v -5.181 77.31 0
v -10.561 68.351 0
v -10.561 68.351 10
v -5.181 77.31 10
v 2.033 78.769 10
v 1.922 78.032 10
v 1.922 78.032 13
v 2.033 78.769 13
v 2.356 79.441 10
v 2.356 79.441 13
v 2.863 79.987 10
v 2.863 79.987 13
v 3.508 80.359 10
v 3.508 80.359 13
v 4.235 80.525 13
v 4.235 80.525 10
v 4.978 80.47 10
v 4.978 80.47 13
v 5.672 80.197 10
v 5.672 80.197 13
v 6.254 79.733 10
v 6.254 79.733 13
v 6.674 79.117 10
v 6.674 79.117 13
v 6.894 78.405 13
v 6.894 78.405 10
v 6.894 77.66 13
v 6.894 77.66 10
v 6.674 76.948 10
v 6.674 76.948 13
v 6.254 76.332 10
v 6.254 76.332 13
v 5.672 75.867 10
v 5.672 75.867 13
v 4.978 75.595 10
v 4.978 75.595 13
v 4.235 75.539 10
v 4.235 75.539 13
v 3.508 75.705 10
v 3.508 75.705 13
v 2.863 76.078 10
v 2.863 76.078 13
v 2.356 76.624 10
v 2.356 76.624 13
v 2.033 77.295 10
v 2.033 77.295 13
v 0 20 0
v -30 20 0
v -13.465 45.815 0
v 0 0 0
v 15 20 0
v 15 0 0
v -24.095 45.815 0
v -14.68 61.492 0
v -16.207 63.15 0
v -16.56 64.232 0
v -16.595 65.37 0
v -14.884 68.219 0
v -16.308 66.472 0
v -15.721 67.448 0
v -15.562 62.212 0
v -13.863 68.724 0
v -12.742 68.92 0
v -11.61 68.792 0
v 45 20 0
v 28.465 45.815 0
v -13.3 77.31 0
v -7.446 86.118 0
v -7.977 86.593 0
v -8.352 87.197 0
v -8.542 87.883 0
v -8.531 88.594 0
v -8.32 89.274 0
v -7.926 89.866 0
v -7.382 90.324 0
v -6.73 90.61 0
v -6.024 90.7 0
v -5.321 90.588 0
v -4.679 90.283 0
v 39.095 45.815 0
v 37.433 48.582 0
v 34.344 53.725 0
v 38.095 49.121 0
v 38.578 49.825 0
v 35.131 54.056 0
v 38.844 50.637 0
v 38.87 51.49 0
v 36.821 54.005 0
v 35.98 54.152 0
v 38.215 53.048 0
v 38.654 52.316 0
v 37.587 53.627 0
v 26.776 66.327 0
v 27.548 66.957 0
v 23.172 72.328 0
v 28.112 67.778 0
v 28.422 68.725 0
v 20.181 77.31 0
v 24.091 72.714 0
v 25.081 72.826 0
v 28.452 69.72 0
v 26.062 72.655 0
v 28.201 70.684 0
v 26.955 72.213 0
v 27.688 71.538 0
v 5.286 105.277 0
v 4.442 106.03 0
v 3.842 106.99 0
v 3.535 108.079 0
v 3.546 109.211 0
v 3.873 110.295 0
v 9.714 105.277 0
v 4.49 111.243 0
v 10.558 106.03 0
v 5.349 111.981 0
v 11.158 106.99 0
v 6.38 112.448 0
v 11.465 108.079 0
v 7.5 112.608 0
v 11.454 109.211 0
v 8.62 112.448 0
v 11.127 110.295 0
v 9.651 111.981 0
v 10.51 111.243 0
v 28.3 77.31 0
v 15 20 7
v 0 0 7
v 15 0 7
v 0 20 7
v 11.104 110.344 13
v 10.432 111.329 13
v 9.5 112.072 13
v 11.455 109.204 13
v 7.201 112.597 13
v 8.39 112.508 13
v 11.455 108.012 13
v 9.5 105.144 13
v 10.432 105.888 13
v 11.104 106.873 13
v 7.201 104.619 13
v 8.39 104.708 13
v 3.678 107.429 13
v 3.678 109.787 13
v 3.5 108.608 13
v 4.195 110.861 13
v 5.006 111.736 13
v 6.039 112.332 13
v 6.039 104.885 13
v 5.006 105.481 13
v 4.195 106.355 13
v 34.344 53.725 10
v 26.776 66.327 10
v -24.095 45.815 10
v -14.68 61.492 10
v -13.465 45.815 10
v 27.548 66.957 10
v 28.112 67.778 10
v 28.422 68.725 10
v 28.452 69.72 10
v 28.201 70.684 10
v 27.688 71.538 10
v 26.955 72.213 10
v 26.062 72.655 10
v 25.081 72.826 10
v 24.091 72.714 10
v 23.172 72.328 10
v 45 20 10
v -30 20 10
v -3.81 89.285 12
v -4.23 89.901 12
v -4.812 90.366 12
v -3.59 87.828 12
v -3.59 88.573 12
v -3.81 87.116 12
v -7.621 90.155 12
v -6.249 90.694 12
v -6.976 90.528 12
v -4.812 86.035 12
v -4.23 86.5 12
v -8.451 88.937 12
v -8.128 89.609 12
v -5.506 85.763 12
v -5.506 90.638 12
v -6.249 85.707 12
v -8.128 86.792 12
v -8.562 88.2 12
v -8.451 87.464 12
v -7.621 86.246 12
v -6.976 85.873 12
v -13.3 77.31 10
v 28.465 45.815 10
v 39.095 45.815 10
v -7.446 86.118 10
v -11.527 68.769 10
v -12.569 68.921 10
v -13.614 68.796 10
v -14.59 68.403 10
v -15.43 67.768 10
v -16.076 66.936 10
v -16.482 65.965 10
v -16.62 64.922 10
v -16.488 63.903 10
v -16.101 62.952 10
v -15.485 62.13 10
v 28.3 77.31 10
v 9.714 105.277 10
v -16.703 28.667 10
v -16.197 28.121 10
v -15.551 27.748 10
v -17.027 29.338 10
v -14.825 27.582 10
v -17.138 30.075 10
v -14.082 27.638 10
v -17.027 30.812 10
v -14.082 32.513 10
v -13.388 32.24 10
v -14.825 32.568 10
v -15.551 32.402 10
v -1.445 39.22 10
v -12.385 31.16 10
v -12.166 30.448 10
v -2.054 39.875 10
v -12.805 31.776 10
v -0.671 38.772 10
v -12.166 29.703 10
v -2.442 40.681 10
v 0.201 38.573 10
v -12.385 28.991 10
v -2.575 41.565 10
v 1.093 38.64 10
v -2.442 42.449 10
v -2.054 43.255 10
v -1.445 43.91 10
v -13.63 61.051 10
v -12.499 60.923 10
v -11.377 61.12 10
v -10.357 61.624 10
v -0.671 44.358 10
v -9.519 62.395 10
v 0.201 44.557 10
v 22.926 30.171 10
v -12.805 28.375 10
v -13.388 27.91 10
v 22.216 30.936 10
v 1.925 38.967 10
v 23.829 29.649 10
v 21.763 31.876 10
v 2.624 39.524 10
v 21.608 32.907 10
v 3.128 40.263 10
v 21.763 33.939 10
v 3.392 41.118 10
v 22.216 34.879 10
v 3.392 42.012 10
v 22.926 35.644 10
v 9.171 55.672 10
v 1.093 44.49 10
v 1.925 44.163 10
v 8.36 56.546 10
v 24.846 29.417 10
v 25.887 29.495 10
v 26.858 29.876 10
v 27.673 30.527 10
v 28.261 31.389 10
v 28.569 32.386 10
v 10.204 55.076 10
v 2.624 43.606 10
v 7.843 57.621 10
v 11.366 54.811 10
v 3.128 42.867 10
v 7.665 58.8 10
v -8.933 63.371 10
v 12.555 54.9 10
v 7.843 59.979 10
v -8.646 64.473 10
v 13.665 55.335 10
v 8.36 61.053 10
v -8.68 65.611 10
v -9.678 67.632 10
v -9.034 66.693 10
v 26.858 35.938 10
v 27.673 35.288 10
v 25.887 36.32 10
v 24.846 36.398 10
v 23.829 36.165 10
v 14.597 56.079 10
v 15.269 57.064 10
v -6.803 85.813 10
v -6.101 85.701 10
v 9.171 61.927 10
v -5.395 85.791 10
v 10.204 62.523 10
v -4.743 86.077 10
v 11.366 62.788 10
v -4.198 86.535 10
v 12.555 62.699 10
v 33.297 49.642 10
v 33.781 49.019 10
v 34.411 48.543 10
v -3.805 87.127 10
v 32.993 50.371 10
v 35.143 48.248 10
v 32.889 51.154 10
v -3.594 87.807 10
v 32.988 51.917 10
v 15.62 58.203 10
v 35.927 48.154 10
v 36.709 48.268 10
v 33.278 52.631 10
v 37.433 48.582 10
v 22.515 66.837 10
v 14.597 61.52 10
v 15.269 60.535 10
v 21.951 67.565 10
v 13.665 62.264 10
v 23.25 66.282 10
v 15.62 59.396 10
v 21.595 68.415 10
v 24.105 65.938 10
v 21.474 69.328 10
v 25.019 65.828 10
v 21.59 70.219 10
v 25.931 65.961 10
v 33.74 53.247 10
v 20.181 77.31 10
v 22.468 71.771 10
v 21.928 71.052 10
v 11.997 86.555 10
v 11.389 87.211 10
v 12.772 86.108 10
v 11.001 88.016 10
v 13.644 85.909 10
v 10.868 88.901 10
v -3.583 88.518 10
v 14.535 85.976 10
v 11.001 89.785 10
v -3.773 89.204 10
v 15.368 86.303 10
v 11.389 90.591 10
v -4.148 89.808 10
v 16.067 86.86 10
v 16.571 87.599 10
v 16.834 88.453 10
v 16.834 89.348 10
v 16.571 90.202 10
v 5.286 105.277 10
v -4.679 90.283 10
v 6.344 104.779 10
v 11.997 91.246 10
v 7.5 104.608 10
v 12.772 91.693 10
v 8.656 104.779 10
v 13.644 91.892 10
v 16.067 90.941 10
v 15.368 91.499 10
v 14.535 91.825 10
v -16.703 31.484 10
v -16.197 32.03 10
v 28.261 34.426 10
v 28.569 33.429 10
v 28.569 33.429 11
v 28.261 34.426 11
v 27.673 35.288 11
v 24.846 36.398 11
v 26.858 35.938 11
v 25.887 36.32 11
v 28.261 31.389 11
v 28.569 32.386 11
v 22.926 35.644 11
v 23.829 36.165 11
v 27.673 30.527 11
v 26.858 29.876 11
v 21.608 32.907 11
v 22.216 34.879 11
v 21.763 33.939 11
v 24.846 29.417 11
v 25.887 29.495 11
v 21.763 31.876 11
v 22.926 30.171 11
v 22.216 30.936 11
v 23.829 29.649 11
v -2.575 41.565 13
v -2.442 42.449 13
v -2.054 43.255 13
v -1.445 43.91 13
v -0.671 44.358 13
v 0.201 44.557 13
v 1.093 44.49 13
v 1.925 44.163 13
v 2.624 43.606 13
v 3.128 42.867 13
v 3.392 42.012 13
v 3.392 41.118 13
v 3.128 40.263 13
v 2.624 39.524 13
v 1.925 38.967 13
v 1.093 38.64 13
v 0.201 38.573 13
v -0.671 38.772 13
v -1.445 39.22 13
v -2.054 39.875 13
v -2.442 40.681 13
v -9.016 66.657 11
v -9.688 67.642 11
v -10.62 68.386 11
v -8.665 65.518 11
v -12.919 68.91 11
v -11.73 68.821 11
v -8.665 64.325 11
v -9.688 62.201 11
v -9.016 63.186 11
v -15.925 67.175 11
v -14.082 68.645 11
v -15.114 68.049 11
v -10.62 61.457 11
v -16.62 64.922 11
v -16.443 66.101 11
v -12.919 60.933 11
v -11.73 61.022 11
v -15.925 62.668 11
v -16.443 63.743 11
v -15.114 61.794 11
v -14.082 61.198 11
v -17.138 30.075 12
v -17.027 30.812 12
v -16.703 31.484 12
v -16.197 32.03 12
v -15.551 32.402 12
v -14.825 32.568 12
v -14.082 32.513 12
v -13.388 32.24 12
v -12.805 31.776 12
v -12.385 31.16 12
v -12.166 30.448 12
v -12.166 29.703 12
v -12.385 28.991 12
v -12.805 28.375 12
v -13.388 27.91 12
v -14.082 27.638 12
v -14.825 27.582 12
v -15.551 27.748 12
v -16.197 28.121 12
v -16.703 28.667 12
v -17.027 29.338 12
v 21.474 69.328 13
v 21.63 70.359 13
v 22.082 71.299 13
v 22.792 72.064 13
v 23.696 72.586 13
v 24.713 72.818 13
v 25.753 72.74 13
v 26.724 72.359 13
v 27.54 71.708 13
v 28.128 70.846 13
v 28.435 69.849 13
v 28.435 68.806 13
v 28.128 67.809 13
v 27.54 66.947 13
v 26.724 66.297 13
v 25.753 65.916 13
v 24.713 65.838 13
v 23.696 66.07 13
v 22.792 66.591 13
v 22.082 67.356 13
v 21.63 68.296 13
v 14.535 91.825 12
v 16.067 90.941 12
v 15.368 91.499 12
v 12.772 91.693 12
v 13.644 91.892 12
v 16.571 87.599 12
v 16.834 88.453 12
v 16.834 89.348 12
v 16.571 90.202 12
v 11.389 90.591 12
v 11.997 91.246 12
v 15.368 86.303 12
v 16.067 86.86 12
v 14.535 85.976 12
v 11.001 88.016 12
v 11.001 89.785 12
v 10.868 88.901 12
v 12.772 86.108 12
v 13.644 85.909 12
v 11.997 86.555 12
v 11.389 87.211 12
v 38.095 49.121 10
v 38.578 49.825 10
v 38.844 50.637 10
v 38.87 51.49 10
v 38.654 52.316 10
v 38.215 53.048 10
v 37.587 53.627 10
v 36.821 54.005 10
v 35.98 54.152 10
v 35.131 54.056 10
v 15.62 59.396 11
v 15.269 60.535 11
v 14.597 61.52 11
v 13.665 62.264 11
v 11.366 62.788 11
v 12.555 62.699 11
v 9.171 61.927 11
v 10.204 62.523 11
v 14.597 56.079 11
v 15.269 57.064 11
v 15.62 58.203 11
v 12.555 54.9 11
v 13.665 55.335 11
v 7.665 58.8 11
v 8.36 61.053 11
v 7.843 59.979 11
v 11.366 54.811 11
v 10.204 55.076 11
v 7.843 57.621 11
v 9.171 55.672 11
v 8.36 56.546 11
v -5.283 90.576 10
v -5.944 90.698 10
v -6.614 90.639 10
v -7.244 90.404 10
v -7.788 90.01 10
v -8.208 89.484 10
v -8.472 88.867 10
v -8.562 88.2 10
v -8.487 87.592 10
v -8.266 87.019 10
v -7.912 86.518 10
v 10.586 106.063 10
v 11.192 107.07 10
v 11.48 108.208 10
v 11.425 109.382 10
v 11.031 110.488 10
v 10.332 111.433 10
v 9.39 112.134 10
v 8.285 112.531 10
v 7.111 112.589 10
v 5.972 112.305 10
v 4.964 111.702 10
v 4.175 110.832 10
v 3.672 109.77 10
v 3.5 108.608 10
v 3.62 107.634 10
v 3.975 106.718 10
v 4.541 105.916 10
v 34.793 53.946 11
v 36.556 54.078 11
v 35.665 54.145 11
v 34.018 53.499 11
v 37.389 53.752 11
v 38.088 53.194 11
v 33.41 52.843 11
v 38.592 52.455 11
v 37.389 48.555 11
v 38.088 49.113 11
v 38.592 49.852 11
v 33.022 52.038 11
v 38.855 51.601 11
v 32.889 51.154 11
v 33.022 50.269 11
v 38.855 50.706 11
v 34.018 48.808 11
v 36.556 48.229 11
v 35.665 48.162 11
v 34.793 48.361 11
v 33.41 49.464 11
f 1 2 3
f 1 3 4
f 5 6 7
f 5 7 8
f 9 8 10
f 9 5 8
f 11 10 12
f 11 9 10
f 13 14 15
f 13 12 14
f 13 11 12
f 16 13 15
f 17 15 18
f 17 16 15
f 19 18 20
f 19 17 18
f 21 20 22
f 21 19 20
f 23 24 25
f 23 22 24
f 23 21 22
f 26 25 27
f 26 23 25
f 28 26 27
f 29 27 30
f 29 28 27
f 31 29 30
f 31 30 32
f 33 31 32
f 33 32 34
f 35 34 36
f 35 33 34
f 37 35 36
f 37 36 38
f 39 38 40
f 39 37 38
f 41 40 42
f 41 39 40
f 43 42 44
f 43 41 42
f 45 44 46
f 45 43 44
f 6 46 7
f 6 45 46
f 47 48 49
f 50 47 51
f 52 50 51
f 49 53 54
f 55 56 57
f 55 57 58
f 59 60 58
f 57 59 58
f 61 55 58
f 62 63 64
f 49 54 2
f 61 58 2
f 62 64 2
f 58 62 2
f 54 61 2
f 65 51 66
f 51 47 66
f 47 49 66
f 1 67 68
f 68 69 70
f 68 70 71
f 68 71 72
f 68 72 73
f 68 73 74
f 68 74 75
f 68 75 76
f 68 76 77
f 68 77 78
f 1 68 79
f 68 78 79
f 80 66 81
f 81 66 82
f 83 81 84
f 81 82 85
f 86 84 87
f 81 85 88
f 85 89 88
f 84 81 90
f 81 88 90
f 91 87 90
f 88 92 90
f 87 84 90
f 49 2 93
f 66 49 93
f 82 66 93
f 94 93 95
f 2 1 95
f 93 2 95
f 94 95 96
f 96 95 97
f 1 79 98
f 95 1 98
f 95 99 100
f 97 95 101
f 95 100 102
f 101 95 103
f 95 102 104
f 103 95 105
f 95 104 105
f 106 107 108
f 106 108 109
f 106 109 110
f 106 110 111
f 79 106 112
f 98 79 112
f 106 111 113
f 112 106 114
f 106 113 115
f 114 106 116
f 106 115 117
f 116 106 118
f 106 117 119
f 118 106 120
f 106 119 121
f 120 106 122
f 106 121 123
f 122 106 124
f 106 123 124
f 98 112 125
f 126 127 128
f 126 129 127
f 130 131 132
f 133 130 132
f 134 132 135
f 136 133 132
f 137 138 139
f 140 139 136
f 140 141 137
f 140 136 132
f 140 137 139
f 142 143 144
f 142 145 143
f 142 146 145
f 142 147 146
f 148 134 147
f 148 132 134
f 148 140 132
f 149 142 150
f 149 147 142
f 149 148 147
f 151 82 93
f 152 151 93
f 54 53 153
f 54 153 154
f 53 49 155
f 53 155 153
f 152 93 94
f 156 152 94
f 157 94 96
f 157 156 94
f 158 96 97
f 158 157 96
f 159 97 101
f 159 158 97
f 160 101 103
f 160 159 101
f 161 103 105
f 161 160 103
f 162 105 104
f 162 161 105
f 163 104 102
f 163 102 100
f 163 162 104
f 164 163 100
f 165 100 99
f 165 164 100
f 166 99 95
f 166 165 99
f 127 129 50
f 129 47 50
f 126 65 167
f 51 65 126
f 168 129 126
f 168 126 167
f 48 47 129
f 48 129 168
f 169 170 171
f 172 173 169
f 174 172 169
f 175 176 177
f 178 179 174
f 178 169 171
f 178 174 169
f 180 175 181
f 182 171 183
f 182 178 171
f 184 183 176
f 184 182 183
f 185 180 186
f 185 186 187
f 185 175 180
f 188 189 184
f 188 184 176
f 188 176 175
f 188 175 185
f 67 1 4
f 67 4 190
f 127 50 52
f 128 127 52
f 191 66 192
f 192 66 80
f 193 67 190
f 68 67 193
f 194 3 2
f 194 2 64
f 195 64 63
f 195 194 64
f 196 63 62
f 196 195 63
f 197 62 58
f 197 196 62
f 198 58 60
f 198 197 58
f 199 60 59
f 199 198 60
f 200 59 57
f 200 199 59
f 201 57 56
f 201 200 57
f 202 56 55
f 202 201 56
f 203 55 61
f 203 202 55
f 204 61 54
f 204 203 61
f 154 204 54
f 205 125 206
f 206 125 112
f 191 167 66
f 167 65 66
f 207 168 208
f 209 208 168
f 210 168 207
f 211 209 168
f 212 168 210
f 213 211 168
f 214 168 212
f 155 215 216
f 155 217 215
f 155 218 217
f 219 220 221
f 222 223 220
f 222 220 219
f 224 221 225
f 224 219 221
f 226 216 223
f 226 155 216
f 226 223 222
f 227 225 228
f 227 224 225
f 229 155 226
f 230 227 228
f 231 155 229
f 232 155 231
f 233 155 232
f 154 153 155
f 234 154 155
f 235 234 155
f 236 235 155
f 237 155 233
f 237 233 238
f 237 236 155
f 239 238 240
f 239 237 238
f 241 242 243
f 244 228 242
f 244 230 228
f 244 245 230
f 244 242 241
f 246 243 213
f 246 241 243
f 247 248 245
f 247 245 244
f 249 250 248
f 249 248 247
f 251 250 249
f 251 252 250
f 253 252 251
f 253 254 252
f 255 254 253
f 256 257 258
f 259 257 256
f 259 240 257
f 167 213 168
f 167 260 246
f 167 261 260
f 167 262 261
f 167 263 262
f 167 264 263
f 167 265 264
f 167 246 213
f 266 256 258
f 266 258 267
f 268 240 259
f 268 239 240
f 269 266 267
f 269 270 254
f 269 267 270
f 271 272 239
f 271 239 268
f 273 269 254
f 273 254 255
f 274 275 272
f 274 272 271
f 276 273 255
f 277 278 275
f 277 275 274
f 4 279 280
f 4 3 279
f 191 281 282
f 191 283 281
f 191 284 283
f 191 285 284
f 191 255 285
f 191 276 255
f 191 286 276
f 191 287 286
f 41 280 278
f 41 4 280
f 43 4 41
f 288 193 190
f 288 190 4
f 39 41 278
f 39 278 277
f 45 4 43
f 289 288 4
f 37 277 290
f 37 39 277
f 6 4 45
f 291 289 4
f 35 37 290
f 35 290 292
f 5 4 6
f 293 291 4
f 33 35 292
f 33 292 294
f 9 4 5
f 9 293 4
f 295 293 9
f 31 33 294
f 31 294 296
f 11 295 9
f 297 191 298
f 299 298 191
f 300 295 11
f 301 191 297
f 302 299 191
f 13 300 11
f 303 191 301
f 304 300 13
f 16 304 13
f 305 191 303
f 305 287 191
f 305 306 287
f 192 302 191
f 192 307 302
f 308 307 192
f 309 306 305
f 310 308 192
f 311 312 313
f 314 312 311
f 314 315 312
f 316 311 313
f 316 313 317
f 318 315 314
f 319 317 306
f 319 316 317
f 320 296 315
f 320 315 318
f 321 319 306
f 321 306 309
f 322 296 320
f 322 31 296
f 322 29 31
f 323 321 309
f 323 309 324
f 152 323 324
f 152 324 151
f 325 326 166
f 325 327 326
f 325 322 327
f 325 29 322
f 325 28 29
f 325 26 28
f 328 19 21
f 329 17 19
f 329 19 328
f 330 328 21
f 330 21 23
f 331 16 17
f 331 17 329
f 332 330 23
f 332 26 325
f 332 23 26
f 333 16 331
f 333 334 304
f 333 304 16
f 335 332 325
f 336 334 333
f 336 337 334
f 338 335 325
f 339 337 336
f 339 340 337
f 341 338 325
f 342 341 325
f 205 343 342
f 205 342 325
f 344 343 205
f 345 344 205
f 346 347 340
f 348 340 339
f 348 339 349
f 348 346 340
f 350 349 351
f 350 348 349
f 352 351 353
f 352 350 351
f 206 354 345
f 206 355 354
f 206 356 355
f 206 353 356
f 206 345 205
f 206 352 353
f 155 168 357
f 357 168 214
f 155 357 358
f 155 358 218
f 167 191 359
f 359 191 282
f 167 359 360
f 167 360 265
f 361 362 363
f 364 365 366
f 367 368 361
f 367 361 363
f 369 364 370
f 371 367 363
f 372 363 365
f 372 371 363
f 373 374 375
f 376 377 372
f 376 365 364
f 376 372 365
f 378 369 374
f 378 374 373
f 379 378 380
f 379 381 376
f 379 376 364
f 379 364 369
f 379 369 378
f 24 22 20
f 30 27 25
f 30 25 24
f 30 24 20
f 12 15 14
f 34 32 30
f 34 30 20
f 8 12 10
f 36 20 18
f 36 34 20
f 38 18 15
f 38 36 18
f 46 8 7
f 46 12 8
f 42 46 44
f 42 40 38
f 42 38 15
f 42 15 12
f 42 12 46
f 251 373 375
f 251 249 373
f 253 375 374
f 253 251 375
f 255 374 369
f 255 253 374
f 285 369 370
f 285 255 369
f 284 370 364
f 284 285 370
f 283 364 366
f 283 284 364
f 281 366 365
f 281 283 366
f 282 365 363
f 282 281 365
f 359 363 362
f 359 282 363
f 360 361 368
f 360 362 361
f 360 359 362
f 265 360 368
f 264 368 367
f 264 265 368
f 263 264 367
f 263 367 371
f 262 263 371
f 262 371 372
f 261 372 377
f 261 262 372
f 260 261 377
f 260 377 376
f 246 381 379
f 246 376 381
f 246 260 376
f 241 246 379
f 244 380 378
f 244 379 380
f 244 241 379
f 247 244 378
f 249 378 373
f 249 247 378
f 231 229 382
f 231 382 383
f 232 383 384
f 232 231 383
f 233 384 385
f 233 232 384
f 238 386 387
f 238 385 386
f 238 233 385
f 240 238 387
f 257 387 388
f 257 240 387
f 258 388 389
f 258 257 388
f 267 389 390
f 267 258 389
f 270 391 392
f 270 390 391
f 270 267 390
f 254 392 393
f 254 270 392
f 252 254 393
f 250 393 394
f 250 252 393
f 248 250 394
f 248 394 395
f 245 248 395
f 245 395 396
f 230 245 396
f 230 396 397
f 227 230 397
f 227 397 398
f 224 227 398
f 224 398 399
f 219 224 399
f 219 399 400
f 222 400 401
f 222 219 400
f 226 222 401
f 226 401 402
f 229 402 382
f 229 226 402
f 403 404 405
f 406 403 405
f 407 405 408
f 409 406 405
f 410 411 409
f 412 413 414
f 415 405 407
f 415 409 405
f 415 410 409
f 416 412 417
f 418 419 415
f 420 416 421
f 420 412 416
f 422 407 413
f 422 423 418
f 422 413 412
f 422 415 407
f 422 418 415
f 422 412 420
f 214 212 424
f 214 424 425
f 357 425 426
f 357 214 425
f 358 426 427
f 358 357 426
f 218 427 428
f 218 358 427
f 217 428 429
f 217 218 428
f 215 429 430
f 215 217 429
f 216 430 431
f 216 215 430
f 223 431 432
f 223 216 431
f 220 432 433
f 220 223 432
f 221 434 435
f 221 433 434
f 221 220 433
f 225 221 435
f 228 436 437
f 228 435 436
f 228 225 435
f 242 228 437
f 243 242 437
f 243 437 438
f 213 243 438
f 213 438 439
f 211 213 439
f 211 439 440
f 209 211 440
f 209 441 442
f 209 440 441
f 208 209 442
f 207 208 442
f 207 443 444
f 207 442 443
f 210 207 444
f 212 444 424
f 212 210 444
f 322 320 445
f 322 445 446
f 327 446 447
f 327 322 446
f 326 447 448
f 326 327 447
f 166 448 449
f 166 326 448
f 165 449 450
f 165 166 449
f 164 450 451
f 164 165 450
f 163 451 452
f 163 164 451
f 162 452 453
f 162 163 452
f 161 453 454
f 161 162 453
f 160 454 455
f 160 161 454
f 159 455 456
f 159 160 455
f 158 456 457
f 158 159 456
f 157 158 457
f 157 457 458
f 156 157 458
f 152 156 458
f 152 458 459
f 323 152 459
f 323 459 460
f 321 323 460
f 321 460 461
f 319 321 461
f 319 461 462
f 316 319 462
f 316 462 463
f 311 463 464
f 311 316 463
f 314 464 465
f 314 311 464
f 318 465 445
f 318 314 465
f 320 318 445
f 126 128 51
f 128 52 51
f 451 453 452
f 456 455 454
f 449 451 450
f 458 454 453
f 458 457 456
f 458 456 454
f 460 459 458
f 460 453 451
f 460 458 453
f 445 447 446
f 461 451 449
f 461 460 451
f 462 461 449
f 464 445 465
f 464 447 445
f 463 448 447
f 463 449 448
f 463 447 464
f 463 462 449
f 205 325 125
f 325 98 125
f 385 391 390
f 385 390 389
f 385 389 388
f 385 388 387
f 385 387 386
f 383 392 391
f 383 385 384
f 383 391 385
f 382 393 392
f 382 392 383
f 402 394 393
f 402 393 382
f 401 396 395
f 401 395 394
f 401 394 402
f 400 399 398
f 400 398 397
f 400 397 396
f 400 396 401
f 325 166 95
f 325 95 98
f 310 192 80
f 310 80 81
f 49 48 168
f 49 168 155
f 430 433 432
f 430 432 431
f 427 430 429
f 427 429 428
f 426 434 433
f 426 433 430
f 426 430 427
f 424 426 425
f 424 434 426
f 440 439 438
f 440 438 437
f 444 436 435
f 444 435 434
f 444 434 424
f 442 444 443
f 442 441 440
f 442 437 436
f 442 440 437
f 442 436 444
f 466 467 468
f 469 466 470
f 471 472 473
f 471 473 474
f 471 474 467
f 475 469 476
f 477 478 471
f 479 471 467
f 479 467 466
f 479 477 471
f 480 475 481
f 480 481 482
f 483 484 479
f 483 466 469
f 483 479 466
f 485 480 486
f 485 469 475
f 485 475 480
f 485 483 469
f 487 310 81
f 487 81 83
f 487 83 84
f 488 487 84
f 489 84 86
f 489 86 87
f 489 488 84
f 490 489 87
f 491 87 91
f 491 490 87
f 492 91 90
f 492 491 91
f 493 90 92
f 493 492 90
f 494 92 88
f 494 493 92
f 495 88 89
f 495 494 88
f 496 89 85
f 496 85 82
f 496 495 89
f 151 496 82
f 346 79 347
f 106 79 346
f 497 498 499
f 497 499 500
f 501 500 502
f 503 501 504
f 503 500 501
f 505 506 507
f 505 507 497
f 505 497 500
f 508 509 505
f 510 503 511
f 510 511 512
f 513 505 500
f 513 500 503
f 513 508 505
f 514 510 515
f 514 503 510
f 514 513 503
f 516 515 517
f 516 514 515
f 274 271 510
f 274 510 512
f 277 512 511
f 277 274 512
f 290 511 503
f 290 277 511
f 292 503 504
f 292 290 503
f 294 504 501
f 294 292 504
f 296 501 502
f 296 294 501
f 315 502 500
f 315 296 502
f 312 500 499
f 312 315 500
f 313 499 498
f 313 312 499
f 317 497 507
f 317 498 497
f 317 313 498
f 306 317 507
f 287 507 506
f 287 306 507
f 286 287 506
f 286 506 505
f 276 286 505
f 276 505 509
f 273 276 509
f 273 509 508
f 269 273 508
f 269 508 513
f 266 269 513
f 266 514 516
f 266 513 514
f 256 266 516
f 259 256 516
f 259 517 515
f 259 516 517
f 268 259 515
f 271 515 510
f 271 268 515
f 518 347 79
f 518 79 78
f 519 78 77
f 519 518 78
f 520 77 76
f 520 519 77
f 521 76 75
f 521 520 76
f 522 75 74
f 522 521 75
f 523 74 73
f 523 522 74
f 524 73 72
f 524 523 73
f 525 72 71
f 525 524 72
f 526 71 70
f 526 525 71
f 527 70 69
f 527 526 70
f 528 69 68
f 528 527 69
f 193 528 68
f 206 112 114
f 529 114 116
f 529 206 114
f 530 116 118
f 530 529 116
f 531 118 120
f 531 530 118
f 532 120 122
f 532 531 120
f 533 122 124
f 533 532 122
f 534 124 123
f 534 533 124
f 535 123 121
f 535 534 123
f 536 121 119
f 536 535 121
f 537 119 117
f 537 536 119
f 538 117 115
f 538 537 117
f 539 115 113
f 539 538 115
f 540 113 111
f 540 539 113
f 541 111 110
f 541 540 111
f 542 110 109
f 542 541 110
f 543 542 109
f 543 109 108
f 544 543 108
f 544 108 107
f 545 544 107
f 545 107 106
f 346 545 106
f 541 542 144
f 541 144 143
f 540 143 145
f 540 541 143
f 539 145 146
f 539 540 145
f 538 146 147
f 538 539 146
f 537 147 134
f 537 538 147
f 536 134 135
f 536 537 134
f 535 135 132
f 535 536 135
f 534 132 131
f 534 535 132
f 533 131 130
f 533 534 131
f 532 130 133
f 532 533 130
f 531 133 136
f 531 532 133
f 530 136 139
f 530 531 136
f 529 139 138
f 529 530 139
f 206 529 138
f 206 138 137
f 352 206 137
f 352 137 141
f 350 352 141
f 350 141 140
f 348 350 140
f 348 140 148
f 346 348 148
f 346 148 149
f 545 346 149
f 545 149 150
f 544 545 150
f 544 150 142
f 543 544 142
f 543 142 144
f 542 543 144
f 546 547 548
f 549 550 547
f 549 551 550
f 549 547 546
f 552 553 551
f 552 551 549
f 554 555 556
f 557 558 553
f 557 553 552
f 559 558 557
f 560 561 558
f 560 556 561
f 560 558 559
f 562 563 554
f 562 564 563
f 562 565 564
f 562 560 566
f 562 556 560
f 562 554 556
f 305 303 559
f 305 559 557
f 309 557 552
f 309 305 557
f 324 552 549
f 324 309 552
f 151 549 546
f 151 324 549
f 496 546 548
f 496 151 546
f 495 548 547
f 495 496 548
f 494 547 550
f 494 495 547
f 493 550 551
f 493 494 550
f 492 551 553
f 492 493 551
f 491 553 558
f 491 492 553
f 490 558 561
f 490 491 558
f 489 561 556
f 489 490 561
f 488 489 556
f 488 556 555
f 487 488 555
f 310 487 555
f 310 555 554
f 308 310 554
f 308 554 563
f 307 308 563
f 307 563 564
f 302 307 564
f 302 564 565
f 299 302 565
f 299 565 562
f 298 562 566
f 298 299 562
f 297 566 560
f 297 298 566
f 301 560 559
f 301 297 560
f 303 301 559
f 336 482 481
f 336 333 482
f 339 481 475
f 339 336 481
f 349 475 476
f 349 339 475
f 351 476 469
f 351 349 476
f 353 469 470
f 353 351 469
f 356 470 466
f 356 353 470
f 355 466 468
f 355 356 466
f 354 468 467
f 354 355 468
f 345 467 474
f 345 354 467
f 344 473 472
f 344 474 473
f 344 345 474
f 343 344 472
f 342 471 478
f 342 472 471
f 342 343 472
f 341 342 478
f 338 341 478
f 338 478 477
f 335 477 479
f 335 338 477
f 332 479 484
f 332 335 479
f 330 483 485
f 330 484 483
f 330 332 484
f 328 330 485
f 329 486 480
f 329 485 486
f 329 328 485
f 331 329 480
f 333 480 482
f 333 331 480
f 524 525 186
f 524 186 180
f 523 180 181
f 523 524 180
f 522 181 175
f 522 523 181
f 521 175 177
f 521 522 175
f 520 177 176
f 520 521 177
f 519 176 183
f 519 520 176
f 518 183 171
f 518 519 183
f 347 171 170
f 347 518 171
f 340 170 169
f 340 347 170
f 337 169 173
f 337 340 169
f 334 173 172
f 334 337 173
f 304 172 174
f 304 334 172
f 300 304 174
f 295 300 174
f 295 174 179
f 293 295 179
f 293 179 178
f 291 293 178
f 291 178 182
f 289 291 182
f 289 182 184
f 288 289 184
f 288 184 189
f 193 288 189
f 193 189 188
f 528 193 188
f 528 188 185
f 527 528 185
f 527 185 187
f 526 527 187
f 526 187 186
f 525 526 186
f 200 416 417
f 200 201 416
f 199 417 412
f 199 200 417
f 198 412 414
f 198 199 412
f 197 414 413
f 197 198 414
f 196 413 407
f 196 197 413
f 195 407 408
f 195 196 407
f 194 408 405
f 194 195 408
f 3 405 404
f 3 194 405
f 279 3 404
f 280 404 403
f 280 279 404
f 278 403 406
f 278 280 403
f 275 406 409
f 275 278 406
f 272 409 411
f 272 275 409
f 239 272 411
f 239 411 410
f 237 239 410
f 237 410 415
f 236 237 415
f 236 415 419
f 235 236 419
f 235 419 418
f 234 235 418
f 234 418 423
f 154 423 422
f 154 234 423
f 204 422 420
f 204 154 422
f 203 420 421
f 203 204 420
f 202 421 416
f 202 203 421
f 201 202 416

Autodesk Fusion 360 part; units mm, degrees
sketch "Sketch1" plane through (0, 0, 0) normal (0, 0, 1) x (1, 0, 0)
  line L0 (0, 0) -> (15, 0)
  line L1 (15, 0) -> (15, 20)
  line L2 (15, 20) -> (0, 20)
  line L3 (0, 20) -> (0, 0)
  line L4 (0, 20) -> (-30, 20)
  line L5 (15, 20) -> (45, 20)
  line L6 (45, 20) -> (28.4651, 45.8146)
  line L7 (28.4651, 45.8146) -> (39.0949, 45.8146)
  line L8 (39.0949, 45.8146) -> (20.1808, 77.3096)
  line L9 (20.1808, 77.3096) -> (28.3002, 77.3096)
  line L10 (28.3002, 77.3096) -> (7.5, 108.6082)
  line L11 (-13.3002, 77.3096) -> (7.5, 108.6082)
  line L12 (-5.1808, 77.3096) -> (-13.3002, 77.3096)
  line L13 (-24.0949, 45.8146) -> (-5.1808, 77.3096)
  line L14 (-13.4651, 45.8146) -> (-24.0949, 45.8146)
  line L15 (-30, 20) -> (-13.4651, 45.8146)
  dimension "d1" = 15
  dimension "d2" = 20
  dimension "d3" = 30
extrude "Extrude1" add sketch "Sketch1" along normal blind 10 contours L2 L4 L5 L6 L7 L8 L9 L10 L11 L12 L13 L14 L15
extrude "Extrude2" add sketch "Sketch1" along normal blind 7 contours L0 L1 L2 L3
sketch "Sketch2" plane through (0, 0, 10) normal (0, 0, 1) x (-1, 0, 0)
  line L0 (30, -20) -> (-45, -20)
  line L1 (-45, -20) -> (-28.4651, -45.8146)
  line L2 (-28.4651, -45.8146) -> (-39.0949, -45.8146)
  line L3 (-39.0949, -45.8146) -> (-20.1808, -77.3096)
  line L4 (-20.1808, -77.3096) -> (-28.3002, -77.3096)
  line L5 (-28.3002, -77.3096) -> (-7.5, -108.6082)
  line L6 (-7.5, -108.6082) -> (13.3002, -77.3096)
  line L7 (13.3002, -77.3096) -> (5.1808, -77.3096)
  line L8 (5.1808, -77.3096) -> (24.0949, -45.8146)
  line L9 (24.0949, -45.8146) -> (13.4651, -45.8146)
  line L10 (13.4651, -45.8146) -> (30, -20)
  circle A0 centre (6.0624, -88.2005) radius 2.5
  circle A1 centre (-24.9742, -69.3278) radius 3.5
  circle A2 centre (-0.4251, -41.565) radius 3
  circle A3 centre (-25.1078, -32.9073) radius 3.5
  circle A4 centre (-13.8678, -88.9006) radius 3
  circle A5 centre (12.6203, -64.9216) radius 4
  circle A6 centre (-4.4215, -78.0323) radius 2.5
  circle A7 centre (-11.665, -58.7996) radius 4
  circle A8 centre (-7.5, -108.6082) radius 4
  circle A9 centre (14.6379, -30.0753) radius 2.5
  circle A10 centre (-35.8887, -51.1535) radius 3
  dimension "d8" = 5
  dimension "d9" = 7
  dimension "d10" = 6
  dimension "d11" = 7
  dimension "d12" = 6
  dimension "d13" = 8
  dimension "d14" = 5
  dimension "d15" = 8
  dimension "d16" = 8
  dimension "d17" = 5
  dimension "d18" = 6
extrude "Extrude3" add sketch "Sketch2" along normal blind 3 contours L3 A1 | L3 A1 | L5 L6 A8 | L5 L6 A8 | A2 | A6
extrude "Extrude4" add sketch "Sketch2" along normal blind 2 contours L6 A0 | L6 A0 | A4 | A9
extrude "Extrude5" add sketch "Sketch2" along normal blind 1 contours L8 A5 | L8 A5 | L3 A10 | L3 A10 | A3 | A7
extrude "Extrude6" add sketch "Sketch2" against normal blind 10 contours L8 A5 | L3 A10 | L3 A1 | L6 A0 | L5 L6 A8 picked at (13.8963, -64.5349) picked at (-37.2683, -51.7586) picked at (-26.1307, -69.1738) picked at (6.8875, -88.0837) picked at (-4.8478, -108.804)
sketch "Sketch3" plane through (0, 0, 0) normal (0, 0, 1) x (1, 0, 0)
  line L0 (45, 20) -> (15, 20)
  line L1 (15, 20) -> (15, 0)
  line L2 (15, 0) -> (0, 0)
  line L3 (0, 0) -> (0, 20)
  line L4 (0, 20) -> (-30, 20)
  line L5 (-30, 20) -> (-13.4651, 45.8146)
  line L6 (-13.4651, 45.8146) -> (-24.0949, 45.8146)
  line L7 (-24.0949, 45.8146) -> (-14.6797, 61.4925)
  arc A0 (-10.561, 68.3508) -> (-14.6797, 61.4925) centre (-12.6203, 64.9216) ccw
  line L8 (-10.561, 68.3508) -> (-5.1808, 77.3096)
  line L9 (-5.1808, 77.3096) -> (-13.3002, 77.3096)
  line L10 (-13.3002, 77.3096) -> (-7.4461, 86.1184)
  arc A1 (-4.6787, 90.2827) -> (-7.4461, 86.1184) centre (-6.0624, 88.2005) ccw
  line L11 (-4.6787, 90.2827) -> (5.286, 105.2768)
  arc A2 (9.714, 105.2768) -> (5.286, 105.2768) centre (7.5, 108.6082) ccw
  line L12 (9.714, 105.2768) -> (28.3002, 77.3096)
  line L13 (28.3002, 77.3096) -> (20.1808, 77.3096)
  line L14 (20.1808, 77.3096) -> (23.1723, 72.3283)
  arc A3 (26.7762, 66.3273) -> (23.1723, 72.3283) centre (24.9742, 69.3278) ccw
  line L15 (26.7762, 66.3273) -> (34.3442, 53.7254)
  arc A4 (37.4332, 48.5817) -> (34.3442, 53.7254) centre (35.8887, 51.1535) ccw
  line L16 (37.4332, 48.5817) -> (39.0949, 45.8146)
  line L17 (39.0949, 45.8146) -> (28.4651, 45.8146)
  line L18 (28.4651, 45.8146) -> (45, 20)
  circle A5 centre (4.4215, 78.0323) radius 2.5
  circle A6 centre (-12.6203, 64.9216) radius 4
  line L19 (7.5, 108.6082) -> (-13.3002, 77.3096)
  circle A7 centre (-6.0624, 88.2005) radius 2.5
  circle A8 centre (13.8678, 88.9006) radius 3
  circle A9 centre (7.5, 108.6082) radius 4
  circle A10 centre (24.9742, 69.3278) radius 3.5
  circle A11 centre (24.9742, 69.3278) radius 3.5
  circle A12 centre (11.665, 58.7996) radius 4
  circle A13 centre (0.4251, 41.565) radius 3
  circle A14 centre (25.1078, 32.9073) radius 3.5
  circle A15 centre (-14.6379, 30.0753) radius 2.5
  circle A16 centre (35.8887, 51.1535) radius 3
  line L20 (0, 20) -> (0, 0)
  line L21 (0, 0) -> (15, 0)
  line L22 (15, 0) -> (15, 20)
  line L23 (15, 20) -> (0, 20)
